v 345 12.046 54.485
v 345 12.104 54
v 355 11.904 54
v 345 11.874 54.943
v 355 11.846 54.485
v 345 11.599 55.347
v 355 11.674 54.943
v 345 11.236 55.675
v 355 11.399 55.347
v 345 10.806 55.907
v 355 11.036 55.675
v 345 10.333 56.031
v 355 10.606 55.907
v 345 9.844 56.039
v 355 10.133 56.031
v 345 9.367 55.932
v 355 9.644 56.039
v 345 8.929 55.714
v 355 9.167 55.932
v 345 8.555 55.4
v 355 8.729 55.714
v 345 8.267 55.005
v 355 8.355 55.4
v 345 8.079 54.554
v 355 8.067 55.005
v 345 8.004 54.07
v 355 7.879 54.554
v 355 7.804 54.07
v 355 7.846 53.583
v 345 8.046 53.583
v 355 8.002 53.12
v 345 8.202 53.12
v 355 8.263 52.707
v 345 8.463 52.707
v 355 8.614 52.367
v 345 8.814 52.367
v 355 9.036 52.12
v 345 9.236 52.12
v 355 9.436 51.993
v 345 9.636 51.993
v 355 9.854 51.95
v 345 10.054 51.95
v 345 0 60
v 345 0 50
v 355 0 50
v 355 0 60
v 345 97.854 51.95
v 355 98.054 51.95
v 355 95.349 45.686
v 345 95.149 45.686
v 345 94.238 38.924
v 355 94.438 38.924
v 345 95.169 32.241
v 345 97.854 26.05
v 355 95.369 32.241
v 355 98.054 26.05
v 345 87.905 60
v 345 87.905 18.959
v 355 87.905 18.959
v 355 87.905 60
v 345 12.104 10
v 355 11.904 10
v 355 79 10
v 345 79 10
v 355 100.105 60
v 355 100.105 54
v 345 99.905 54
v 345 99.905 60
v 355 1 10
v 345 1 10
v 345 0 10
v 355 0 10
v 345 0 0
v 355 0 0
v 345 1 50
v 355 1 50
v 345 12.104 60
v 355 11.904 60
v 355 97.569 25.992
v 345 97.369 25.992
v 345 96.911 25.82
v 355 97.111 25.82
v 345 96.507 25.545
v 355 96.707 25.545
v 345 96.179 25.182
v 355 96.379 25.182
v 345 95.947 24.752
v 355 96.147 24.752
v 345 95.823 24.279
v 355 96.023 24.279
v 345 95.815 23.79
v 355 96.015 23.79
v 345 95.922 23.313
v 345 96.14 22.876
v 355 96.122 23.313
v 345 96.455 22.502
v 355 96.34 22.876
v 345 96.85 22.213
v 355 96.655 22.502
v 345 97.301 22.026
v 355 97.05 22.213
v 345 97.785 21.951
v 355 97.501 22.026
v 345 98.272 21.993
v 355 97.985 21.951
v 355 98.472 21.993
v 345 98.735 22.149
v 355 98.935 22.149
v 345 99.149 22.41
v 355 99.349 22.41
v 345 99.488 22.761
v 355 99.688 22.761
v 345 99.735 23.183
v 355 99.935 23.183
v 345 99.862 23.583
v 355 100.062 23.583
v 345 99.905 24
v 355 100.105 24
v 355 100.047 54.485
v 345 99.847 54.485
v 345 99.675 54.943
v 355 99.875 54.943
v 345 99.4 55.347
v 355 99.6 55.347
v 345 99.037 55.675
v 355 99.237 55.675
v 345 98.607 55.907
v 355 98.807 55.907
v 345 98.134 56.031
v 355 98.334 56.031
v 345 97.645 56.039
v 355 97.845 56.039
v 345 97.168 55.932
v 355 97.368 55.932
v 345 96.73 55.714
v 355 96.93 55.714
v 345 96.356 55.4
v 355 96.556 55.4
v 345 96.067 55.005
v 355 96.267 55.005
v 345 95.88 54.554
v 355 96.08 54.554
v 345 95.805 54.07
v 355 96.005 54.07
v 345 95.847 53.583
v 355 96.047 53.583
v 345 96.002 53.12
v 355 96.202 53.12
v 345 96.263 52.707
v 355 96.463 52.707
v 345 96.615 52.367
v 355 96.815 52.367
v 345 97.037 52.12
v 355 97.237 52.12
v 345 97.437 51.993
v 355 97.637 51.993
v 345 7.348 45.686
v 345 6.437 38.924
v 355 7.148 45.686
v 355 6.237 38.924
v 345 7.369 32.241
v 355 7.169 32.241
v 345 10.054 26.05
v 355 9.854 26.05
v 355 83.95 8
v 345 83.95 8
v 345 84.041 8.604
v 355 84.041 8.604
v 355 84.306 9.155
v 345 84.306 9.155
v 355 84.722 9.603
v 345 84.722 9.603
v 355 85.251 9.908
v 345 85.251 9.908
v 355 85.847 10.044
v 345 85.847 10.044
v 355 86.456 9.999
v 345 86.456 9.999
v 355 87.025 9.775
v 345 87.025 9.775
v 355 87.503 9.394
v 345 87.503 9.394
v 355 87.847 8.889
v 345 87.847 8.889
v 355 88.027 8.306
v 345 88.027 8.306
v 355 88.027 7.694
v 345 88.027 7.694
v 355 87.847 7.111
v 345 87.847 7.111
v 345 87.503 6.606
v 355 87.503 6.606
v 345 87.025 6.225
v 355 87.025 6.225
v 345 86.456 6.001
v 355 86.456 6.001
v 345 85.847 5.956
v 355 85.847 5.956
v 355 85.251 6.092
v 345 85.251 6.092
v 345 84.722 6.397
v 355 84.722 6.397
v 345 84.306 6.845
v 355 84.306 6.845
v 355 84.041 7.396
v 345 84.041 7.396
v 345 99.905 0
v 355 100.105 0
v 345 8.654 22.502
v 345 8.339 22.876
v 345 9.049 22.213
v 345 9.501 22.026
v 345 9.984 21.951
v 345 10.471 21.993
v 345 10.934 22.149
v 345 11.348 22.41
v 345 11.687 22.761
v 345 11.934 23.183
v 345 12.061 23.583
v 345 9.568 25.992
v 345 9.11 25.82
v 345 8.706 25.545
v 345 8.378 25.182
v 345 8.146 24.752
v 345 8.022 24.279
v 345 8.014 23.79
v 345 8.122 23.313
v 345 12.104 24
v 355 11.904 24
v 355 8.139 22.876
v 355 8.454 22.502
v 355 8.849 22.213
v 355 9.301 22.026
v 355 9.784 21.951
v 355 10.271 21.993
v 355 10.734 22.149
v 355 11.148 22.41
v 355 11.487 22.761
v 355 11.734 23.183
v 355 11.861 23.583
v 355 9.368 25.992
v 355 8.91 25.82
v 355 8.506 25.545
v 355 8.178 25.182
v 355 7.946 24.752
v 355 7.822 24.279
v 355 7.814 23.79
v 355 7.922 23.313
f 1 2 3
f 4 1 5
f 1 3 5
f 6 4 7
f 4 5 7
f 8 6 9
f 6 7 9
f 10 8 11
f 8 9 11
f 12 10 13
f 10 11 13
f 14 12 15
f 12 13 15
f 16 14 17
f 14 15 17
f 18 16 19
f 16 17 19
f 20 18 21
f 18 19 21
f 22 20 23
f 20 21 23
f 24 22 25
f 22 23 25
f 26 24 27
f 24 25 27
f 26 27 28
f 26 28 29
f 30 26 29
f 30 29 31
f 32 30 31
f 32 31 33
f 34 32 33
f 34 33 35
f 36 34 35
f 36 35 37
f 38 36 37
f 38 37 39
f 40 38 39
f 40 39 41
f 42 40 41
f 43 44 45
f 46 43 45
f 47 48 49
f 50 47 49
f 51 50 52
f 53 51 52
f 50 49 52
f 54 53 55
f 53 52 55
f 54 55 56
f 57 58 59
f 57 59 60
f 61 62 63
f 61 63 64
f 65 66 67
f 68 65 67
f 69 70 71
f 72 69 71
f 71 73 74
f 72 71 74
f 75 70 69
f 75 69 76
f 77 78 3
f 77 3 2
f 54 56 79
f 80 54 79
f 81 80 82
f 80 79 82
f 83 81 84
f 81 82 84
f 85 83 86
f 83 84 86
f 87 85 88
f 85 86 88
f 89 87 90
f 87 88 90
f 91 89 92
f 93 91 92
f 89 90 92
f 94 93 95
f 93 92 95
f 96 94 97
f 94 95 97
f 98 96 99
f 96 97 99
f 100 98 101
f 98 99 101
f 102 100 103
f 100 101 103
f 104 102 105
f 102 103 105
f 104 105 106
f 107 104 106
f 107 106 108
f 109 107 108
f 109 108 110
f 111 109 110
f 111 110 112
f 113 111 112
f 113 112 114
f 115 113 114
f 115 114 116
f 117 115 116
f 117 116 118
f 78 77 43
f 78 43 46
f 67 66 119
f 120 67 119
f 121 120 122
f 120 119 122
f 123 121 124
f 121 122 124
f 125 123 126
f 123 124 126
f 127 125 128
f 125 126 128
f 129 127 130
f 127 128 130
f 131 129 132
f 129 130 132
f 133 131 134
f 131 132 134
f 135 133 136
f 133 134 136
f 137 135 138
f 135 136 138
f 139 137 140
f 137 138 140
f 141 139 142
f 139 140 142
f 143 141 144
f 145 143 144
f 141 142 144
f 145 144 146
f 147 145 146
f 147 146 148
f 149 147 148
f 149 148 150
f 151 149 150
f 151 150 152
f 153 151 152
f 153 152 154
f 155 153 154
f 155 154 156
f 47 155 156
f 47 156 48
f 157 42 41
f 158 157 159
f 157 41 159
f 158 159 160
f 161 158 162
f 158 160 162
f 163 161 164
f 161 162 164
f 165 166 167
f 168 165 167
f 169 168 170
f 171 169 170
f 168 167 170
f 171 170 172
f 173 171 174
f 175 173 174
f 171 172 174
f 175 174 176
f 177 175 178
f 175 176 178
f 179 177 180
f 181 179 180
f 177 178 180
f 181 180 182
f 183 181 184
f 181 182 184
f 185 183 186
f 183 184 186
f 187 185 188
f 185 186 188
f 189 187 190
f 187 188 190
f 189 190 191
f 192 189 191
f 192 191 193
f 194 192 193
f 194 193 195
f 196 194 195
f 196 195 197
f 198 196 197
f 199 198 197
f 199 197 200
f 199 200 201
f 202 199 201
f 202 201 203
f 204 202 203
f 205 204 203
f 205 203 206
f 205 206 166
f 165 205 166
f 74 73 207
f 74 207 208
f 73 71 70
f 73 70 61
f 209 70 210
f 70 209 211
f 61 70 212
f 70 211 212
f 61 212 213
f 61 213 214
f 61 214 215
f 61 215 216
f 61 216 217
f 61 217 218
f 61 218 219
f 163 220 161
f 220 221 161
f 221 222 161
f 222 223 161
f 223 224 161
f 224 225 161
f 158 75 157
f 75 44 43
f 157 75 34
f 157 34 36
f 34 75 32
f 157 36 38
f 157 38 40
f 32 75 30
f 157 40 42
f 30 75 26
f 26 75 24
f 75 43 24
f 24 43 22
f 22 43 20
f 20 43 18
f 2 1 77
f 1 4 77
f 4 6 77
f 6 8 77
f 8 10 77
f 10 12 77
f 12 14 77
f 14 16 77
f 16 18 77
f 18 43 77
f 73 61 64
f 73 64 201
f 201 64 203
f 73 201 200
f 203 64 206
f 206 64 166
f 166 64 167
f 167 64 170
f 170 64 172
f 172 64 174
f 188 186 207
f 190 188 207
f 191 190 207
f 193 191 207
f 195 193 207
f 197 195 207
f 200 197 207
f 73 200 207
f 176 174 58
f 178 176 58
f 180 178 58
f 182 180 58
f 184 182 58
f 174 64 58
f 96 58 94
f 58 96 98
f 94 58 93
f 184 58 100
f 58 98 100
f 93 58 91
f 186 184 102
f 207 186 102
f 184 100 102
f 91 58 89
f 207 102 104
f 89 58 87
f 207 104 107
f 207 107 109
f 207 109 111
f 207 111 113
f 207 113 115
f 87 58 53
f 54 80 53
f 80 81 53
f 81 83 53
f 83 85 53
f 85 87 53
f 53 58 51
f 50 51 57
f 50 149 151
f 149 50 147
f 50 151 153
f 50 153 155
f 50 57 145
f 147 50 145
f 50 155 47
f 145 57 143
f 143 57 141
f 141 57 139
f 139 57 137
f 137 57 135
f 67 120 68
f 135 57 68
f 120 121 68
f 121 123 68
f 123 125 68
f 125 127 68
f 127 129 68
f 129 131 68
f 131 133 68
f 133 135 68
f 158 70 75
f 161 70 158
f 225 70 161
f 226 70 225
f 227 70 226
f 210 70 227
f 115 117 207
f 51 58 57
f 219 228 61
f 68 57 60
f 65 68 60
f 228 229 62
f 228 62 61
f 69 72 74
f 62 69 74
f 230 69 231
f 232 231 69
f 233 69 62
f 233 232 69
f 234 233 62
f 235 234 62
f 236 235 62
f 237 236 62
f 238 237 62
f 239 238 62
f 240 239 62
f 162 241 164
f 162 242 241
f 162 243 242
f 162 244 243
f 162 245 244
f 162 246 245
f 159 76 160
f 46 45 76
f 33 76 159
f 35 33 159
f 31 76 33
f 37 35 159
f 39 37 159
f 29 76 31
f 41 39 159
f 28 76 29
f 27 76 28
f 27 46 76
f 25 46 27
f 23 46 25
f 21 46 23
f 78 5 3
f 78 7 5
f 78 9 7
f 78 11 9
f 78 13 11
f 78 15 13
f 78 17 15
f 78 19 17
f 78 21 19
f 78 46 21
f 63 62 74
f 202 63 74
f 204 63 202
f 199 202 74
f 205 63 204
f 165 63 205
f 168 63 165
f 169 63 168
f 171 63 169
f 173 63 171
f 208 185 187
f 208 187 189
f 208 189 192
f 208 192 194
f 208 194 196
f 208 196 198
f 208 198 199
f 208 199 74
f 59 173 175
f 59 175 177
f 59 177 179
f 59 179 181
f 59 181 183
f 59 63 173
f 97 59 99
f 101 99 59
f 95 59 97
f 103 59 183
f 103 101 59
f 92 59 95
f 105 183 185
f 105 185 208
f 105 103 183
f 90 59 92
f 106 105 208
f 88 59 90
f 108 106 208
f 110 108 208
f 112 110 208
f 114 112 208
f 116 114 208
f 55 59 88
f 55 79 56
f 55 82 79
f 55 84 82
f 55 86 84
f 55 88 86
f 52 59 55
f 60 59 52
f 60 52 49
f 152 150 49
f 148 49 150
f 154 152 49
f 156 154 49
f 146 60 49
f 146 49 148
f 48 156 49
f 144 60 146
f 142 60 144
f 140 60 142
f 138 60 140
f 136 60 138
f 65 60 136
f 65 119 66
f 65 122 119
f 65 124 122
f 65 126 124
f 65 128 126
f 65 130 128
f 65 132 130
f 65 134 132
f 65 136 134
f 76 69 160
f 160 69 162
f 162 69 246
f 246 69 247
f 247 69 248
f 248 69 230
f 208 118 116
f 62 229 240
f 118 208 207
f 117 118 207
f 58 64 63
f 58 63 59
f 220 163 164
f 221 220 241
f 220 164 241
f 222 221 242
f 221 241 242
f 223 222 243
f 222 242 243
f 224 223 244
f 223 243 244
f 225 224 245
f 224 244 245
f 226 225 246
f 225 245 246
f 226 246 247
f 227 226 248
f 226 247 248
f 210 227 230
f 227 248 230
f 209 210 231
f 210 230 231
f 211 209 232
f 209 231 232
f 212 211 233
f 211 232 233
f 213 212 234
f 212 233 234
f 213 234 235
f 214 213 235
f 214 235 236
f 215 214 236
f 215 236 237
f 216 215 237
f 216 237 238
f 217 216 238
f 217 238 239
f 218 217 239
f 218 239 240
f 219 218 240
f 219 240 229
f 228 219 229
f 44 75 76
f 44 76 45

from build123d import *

# Parameters (mm, degrees)
PAD_DEPTH       = 60
POCKET_DEPTH    = 50
POCKET001_DEPTH = 407.8842315097
POCKET002_DEPTH = 407.6818719776
SKETCH004_W     = 462.917107
SKETCH004_H     = 152.532247
SKETCH004_W_2   = 206.430237
SKETCH004_H_2   = 142.147327
POCKET003_DEPTH = 60.001
SKETCH005_R     = 2.05
SKETCH005_W     = 1
SKETCH005_H     = 40
POCKET004_DEPTH = 10.001


with BuildPart() as part:
    # Sketch → Pad (new body)
    with BuildSketch(Plane.XY):
        Polygon((450, 0), (450, 90), (356, 88.12), (355.76, 100.12), (343.76, 99.88), (344, 87.88), (6, 81.12), (5.76, 93.12), (-6.24, 92.88), (-6, 80.88), (-50, 80), (-50, 0), align=None)
    extrude(amount=PAD_DEPTH)

    # Sketch001 (on Face14 of Pad) → Pocket (cut)
    with BuildSketch(Plane.XY.offset(60)):
        Polygon((-50, 10), (-50, 79), (450, 79), (450, 0), (356, 1.88), (356.2, 11.88), (344.2, 12.12), (344, 2.12), (6, 8.88), (6.2, 18.88), (-5.8, 19.12), (-6, 9.12), align=None)
    extrude(amount=-POCKET_DEPTH, mode=Mode.SUBTRACT)

    # Sketch002 (on Face26 of Pocket) → Pocket001 (cut, through all)
    with BuildSketch(Plane(origin=(355.8200719712, -7.1164014394, 0), x_dir=(0.0199960012, 0.99980006, 0), z_dir=(0.99980006, -0.0199960012, 0))):
        with BuildLine():
            ThreePointArc((19.0002003399, 54), (15.5006314384, 55.4495689014), (16.9502003399, 51.95))
            ThreePointArc((16.9502003399, 51.95), (13.3347157657, 39), (16.9502003399, 26.05))
            ThreePointArc((16.9502003399, 26.05), (15.5006314384, 22.5504310986), (19.0002003399, 24))
            Line((19.0002003399, 24), (19.0002003399, 54))
        make_face()
    extrude(amount=-POCKET001_DEPTH, mode=Mode.SUBTRACT)

    # Sketch003 (on Face14 of Pocket001) → Pocket002 (cut, through all)
    with BuildSketch(Plane(origin=(357.6193522591, 7.1523870452, 0), x_dir=(-0.0199960012, 0.99980006, 0), z_dir=(0.99980006, 0.0199960012, 0))):
        with BuildLine():
            ThreePointArc((92.9862046184, 54), (89.486635717, 55.4495689014), (90.9362046184, 51.95))
            ThreePointArc((90.9362046184, 51.95), (87.3207200443, 39), (90.9362046184, 26.05))
            ThreePointArc((90.9362046184, 26.05), (89.486635717, 22.5504310986), (92.9862046184, 24))
            Line((92.9862046184, 24), (92.9862046184, 54))
        make_face()
    extrude(amount=-POCKET002_DEPTH, mode=Mode.SUBTRACT)

    # Sketch004 (on Face7 of Pocket002) → Pocket003 (cut, through all)
    with BuildSketch(Plane.XY.offset(60)):
        with Locations((113.5414465, 49.6986895)):
            Rectangle(SKETCH004_W, SKETCH004_H)
        with Locations((458.2151185, 57.1989195)):
            Rectangle(SKETCH004_W_2, SKETCH004_H_2)
    extrude(amount=-POCKET003_DEPTH, mode=Mode.SUBTRACT)

    # Sketch005 (on Face2 of Pocket003) → Pocket004 (cut, through all)
    with BuildSketch(Plane(origin=(345, 0, 0), x_dir=(0, -1, 0), z_dir=(-1, 0, 0))):
        with Locations((-86, 8)):
            Circle(SKETCH005_R)
        with Locations((-0.5, 30)):
            Rectangle(SKETCH005_W, SKETCH005_H)
        Polygon((-87.9048, 60), (-79, 60), (-79, 10), (-87.9048, 18.95854), align=None)
    extrude(amount=-POCKET004_DEPTH, mode=Mode.SUBTRACT)


solid = part.part
